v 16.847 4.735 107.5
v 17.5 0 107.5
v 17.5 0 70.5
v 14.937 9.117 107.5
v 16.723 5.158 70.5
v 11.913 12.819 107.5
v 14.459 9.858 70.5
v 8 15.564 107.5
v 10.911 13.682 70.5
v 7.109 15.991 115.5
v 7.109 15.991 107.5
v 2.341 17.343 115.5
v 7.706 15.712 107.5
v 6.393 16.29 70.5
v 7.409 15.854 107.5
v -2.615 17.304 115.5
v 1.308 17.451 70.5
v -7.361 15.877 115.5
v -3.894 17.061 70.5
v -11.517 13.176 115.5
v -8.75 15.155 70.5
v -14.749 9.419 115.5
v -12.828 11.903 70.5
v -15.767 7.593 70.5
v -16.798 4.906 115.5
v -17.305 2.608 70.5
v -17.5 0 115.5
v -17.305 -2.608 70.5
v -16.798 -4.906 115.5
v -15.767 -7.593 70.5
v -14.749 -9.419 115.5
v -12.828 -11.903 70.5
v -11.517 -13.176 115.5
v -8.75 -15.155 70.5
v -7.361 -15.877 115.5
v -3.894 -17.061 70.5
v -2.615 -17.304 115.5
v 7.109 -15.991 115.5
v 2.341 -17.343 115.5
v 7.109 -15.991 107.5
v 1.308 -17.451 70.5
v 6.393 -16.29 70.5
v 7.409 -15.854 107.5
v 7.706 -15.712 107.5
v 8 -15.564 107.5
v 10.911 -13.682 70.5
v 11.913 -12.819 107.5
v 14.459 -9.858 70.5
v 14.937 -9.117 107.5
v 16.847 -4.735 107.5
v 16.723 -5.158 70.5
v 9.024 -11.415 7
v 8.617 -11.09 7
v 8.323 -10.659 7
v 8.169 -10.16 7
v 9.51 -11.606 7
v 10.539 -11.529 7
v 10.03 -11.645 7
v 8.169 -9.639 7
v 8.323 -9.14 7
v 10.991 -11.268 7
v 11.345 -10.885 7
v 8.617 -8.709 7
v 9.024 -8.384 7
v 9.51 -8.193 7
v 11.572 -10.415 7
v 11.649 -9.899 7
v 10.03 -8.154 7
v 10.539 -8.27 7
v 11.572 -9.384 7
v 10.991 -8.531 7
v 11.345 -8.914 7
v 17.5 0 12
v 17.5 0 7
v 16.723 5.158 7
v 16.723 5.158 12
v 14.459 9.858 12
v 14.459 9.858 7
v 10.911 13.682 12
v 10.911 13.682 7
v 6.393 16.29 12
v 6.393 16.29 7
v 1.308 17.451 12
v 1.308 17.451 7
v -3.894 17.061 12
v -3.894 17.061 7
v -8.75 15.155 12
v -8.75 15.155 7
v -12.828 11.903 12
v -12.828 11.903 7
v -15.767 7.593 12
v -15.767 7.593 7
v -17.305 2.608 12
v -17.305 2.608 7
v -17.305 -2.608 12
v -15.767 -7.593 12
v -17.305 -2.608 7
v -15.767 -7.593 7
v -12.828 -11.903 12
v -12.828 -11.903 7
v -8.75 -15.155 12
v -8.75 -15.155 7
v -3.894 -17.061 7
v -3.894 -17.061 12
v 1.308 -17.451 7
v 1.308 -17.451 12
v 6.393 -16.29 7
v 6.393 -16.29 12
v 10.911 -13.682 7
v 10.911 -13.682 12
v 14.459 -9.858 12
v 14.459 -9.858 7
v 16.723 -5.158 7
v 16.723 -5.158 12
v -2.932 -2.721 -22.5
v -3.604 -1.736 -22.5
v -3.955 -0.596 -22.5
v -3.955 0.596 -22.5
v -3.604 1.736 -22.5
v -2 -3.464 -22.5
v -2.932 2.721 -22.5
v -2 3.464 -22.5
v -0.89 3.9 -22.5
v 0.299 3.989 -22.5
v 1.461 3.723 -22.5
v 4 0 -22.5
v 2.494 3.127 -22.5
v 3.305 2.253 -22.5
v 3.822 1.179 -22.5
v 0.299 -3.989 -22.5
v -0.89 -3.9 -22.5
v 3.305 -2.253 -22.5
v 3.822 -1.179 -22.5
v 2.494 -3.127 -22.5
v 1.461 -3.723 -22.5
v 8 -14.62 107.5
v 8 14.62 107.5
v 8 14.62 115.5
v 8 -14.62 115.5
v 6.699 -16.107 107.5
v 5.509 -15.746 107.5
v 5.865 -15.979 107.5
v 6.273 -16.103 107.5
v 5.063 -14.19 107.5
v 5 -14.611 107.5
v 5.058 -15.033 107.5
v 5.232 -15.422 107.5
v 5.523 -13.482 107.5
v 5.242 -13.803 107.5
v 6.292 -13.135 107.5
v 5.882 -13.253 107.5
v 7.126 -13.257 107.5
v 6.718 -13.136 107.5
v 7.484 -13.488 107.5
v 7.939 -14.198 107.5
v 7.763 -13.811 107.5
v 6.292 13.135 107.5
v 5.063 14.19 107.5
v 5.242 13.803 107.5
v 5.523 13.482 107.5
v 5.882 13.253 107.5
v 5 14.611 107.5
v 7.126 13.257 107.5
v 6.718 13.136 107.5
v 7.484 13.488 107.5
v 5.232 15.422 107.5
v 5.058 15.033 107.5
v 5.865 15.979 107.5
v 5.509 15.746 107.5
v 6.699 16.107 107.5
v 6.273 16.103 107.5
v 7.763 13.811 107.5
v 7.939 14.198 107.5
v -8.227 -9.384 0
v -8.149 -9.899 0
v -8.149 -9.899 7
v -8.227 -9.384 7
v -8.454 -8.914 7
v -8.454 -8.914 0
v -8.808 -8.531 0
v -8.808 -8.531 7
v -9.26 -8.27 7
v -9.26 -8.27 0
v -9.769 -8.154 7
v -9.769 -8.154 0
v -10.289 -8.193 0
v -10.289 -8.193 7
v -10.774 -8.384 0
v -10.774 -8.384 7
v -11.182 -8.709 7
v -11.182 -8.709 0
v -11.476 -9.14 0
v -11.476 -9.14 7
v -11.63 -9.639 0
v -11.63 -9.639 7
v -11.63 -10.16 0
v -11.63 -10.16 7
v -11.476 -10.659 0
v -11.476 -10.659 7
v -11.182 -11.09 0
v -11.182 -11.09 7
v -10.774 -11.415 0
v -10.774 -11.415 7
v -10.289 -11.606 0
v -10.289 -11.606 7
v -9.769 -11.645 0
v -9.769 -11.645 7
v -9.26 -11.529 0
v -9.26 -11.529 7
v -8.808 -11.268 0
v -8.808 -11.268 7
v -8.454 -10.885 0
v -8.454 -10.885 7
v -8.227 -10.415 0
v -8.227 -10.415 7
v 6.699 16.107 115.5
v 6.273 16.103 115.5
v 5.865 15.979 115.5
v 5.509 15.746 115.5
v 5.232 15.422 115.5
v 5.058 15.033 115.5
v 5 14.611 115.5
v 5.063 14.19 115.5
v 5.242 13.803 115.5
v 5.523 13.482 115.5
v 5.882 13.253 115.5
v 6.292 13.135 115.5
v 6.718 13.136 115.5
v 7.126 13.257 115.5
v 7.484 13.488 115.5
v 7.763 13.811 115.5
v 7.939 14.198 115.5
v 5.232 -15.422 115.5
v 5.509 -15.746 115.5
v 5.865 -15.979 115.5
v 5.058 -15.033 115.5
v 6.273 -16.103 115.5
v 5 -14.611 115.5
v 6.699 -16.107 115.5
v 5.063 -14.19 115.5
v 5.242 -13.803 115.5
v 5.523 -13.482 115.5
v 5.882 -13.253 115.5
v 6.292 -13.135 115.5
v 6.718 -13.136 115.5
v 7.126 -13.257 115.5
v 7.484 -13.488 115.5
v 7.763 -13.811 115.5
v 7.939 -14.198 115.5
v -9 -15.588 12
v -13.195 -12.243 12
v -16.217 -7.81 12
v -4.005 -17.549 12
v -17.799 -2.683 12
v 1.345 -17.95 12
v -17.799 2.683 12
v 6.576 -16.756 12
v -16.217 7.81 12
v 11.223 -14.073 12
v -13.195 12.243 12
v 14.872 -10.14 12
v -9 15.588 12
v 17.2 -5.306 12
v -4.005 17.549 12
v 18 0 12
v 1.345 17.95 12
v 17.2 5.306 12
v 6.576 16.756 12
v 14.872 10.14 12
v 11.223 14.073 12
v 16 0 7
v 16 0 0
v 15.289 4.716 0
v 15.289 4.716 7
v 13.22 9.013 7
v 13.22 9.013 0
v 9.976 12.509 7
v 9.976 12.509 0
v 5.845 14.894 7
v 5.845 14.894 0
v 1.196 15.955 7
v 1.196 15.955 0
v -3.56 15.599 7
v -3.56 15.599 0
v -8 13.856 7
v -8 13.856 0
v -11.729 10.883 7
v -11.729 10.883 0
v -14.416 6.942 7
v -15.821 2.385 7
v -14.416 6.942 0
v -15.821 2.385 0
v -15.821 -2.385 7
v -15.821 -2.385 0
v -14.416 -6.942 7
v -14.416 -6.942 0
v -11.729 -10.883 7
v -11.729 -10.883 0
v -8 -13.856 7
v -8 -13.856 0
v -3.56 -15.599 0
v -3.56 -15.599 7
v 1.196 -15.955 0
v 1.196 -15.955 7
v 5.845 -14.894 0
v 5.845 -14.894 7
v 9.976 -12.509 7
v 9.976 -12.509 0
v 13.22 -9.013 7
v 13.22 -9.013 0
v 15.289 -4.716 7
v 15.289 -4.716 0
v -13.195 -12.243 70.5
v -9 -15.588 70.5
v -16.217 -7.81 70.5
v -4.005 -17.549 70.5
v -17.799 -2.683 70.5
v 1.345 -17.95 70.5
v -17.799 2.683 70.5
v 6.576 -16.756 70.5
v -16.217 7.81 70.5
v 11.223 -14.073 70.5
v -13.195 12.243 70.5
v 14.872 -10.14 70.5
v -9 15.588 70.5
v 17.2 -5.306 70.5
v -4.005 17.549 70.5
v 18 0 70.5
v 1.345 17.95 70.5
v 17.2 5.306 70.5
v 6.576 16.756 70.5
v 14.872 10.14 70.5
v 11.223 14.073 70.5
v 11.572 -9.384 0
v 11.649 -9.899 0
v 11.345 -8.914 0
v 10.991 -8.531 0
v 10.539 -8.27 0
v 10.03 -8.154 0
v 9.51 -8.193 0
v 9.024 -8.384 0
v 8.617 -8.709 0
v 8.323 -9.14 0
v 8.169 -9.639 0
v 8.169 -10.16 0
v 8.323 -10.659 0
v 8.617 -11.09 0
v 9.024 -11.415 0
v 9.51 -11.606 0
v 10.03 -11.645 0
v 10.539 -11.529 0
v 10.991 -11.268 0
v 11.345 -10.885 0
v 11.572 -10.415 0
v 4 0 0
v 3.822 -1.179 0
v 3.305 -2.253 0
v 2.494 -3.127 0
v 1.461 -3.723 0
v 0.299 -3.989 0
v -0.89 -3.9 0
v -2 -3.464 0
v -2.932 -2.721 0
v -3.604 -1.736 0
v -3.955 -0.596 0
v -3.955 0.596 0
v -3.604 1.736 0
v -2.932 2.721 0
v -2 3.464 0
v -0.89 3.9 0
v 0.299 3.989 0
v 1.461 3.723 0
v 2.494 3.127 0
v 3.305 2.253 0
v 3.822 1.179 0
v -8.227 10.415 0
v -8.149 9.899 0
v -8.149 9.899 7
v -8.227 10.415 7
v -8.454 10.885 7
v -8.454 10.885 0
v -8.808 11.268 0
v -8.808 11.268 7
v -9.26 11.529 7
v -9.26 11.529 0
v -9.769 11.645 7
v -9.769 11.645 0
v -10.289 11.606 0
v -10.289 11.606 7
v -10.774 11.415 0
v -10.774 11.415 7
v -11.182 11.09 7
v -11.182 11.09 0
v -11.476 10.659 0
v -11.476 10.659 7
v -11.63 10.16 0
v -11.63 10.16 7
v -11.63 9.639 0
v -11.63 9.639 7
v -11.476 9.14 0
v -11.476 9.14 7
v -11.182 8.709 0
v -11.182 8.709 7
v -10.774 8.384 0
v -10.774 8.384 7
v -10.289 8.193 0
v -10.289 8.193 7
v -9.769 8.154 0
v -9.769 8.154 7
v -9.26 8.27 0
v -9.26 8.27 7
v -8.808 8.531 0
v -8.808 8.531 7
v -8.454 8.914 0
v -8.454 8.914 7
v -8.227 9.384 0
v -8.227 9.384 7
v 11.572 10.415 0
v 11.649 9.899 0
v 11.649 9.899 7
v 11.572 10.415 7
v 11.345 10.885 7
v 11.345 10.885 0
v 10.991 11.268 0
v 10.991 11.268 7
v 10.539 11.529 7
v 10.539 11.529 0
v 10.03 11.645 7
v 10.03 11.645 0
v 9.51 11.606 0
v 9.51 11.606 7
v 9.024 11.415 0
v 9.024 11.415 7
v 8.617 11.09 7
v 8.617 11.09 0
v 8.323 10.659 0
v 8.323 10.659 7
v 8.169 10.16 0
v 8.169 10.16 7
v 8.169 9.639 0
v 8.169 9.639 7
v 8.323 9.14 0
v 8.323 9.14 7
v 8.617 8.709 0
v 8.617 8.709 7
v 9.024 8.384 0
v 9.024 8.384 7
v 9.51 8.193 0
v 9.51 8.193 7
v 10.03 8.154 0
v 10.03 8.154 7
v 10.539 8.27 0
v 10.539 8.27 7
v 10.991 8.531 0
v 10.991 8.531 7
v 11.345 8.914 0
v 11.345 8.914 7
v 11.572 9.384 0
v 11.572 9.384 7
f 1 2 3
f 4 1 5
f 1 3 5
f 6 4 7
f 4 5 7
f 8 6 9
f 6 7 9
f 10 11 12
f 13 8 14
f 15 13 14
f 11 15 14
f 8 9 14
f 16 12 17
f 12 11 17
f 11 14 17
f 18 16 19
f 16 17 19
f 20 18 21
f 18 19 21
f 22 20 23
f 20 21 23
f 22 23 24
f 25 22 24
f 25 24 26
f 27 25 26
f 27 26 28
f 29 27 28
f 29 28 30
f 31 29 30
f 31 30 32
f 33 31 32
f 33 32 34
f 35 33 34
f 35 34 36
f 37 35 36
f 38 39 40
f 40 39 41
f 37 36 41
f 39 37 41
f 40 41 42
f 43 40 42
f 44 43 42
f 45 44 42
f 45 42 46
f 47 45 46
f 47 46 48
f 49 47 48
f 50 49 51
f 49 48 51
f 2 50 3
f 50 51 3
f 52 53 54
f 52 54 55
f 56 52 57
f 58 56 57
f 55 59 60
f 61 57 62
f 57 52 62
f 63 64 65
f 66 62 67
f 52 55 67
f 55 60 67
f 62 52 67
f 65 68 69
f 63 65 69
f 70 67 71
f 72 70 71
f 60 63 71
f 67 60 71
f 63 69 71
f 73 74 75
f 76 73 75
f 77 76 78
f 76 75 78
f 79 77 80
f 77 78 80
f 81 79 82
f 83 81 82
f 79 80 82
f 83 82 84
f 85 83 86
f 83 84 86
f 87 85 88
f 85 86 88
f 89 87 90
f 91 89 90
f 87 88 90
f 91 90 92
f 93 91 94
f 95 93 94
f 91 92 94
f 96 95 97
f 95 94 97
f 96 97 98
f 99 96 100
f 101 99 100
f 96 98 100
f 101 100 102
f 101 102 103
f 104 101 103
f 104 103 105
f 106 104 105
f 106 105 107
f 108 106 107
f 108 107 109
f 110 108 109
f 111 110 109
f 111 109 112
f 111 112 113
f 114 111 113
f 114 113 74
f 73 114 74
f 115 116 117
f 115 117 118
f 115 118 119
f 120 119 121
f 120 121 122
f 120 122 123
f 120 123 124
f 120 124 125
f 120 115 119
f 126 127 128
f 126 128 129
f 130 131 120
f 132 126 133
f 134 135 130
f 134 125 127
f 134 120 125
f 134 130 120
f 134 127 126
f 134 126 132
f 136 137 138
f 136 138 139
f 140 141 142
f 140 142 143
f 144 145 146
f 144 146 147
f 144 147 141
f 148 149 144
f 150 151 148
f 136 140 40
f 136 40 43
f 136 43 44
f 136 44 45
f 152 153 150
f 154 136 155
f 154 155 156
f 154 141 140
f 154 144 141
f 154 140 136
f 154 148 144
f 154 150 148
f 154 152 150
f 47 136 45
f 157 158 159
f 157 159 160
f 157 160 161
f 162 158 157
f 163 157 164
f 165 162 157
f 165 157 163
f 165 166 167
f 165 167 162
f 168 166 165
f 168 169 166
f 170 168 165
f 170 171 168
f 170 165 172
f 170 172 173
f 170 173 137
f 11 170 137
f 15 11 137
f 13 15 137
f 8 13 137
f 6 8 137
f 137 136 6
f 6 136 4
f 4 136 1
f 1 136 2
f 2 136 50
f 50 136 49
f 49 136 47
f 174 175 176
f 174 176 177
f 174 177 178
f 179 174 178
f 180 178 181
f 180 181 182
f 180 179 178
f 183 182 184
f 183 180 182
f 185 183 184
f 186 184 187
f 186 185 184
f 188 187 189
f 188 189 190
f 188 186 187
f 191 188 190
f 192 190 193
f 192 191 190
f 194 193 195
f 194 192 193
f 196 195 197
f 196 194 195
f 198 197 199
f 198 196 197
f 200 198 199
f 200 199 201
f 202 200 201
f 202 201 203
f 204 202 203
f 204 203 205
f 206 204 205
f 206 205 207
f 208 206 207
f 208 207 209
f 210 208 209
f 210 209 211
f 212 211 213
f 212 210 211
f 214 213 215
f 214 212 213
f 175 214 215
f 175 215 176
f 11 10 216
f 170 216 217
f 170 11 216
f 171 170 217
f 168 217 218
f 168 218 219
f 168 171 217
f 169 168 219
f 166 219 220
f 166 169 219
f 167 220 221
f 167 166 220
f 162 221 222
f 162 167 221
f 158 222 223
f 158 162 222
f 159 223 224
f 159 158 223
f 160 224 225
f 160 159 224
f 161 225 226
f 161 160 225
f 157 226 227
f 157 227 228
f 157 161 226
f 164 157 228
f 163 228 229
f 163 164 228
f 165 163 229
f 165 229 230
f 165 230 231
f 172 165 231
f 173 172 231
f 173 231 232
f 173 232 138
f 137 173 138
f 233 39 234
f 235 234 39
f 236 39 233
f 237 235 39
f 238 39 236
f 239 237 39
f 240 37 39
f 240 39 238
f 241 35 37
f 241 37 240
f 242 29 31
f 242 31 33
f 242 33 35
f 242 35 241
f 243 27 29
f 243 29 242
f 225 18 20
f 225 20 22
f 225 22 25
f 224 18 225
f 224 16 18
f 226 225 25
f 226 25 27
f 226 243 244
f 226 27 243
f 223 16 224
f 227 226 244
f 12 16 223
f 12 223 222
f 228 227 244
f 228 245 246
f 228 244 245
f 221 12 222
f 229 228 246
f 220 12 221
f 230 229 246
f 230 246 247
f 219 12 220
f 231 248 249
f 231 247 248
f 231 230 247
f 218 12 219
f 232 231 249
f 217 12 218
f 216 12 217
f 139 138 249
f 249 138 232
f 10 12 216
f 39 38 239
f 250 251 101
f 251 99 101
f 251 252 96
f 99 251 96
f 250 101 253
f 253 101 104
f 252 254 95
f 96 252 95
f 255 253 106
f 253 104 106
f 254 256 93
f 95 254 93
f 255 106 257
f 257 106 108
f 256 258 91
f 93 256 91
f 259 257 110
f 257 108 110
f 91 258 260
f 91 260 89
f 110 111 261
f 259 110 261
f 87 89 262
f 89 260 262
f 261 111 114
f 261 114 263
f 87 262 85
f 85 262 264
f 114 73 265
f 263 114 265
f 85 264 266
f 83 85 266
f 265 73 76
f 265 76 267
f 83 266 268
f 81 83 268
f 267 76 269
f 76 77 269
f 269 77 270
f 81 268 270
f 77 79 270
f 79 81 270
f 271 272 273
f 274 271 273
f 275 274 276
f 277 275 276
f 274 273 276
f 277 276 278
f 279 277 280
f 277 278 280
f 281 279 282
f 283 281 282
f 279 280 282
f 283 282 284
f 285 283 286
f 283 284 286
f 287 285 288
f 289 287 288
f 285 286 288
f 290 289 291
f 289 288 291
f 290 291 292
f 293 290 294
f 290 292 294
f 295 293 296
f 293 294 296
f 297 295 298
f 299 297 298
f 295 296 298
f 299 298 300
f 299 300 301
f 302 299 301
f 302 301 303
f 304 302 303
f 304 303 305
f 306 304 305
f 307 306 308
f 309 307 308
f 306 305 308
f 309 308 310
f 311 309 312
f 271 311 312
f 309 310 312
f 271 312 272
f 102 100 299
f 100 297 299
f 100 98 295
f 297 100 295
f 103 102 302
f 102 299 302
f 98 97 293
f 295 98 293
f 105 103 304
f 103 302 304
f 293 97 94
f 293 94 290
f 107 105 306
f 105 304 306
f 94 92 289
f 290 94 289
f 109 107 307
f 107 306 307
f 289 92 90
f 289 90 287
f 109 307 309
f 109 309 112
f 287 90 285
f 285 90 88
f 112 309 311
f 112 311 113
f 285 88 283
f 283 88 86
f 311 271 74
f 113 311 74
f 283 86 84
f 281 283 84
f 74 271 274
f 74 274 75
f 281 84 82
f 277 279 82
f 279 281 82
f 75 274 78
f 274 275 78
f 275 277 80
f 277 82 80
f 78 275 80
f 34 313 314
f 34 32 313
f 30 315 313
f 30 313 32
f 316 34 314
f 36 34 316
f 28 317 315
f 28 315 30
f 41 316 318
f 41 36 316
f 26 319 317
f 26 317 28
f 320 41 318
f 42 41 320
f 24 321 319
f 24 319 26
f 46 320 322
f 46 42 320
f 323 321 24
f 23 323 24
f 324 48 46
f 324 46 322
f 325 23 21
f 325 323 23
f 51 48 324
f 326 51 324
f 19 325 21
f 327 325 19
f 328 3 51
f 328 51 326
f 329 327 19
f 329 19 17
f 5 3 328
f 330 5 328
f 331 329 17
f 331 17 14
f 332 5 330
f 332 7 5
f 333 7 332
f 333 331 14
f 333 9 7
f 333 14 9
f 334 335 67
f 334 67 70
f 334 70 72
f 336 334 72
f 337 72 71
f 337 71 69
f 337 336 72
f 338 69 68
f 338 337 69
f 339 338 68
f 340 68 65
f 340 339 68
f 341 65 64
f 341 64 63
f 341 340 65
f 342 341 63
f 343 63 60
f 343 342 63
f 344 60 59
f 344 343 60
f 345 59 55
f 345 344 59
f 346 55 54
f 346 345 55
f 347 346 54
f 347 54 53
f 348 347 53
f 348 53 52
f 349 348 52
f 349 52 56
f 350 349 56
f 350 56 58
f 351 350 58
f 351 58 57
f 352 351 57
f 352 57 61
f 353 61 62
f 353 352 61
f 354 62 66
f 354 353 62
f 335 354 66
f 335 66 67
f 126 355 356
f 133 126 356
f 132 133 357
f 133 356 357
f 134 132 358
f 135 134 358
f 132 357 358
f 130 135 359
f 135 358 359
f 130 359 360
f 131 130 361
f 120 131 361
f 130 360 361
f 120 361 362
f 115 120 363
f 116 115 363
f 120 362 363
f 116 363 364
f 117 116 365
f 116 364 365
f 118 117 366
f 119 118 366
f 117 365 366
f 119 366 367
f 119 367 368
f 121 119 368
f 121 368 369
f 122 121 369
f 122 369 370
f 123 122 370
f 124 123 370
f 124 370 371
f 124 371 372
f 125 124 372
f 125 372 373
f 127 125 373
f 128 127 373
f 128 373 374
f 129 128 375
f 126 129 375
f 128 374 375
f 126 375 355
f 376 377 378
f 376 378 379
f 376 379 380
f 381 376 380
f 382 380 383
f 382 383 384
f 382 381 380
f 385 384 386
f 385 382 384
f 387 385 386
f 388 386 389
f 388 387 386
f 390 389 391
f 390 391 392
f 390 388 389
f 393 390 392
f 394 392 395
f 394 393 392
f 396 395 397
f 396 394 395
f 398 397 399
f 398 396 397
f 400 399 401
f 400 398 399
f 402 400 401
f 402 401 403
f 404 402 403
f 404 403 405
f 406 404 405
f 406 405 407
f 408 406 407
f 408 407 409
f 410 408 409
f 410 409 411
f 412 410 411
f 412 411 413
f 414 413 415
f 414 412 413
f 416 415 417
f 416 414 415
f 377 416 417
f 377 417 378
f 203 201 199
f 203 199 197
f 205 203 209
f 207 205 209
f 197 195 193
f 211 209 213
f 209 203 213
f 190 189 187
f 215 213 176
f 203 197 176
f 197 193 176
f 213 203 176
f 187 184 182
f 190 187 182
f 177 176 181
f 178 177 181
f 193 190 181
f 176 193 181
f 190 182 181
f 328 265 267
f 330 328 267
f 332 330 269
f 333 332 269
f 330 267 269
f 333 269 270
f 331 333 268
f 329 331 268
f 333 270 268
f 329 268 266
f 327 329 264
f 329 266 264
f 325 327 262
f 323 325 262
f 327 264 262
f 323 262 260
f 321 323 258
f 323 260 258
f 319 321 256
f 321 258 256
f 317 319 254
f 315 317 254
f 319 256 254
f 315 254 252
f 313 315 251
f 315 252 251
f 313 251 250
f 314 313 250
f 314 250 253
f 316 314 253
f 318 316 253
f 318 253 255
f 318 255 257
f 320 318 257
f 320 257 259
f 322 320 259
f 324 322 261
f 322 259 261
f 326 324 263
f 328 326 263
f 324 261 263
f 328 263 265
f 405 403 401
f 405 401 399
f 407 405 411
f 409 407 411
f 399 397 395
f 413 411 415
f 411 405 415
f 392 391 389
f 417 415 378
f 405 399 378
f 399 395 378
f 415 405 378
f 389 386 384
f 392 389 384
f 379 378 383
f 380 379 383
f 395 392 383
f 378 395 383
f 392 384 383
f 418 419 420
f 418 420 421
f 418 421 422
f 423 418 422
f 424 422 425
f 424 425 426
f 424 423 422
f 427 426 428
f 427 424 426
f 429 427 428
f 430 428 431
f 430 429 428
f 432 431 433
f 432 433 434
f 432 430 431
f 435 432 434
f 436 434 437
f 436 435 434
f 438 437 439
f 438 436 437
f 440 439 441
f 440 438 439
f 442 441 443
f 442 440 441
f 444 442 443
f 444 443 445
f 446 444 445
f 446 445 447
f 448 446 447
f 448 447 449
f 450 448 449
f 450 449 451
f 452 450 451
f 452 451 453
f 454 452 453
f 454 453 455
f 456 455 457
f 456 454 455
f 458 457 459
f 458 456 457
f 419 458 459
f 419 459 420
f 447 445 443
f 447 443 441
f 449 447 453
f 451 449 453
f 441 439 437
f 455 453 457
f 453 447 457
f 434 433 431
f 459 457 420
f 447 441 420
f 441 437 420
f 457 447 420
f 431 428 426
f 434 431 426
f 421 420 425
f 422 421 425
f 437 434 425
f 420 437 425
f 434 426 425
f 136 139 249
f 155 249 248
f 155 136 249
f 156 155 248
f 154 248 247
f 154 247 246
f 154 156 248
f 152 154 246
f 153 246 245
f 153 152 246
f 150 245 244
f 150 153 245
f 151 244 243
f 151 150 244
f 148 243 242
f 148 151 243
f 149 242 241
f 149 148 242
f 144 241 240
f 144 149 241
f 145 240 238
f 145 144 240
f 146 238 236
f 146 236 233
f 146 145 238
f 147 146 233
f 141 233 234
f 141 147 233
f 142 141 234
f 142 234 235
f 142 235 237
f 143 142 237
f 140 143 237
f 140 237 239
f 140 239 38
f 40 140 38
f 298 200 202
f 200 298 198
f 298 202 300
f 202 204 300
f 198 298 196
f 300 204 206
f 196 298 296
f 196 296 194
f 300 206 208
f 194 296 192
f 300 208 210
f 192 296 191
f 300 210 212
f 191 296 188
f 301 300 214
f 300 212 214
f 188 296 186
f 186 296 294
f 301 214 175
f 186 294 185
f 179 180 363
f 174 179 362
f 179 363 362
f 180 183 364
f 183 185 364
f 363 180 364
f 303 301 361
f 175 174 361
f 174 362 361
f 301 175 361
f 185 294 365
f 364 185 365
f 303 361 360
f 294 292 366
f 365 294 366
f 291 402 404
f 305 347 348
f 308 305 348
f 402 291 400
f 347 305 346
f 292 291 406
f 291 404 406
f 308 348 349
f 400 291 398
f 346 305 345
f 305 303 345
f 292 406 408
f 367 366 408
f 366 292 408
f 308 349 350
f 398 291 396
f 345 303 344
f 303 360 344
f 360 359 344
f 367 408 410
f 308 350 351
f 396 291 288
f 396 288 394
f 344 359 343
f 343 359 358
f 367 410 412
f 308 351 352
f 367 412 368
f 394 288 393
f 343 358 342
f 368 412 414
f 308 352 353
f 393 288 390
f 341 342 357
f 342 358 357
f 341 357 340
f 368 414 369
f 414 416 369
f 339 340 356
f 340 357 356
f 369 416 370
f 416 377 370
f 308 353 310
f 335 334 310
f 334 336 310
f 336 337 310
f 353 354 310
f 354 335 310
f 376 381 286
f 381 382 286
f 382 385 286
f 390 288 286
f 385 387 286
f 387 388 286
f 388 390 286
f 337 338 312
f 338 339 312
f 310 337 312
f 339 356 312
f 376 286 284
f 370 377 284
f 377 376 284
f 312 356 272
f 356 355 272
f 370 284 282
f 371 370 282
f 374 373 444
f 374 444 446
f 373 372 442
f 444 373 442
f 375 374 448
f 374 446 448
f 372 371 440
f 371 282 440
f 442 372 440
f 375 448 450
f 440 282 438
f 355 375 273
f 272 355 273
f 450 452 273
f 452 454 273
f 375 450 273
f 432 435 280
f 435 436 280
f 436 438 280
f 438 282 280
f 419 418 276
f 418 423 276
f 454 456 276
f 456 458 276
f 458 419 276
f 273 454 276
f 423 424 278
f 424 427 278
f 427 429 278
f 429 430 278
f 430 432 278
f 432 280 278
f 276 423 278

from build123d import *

# Parameters (mm, degrees)
SKETCH1_R           = 16
SKETCH1_R_2         = 1.75
SKETCH1_R_3         = 11.25
BOSS_EXTRUDE1_DEPTH = 7
SKETCH2_R           = 17.5
BOSS_EXTRUDE2_DEPTH = 108.5
SKETCH3_R           = 4
BOSS_EXTRUDE3_DEPTH = 22.5
BOSS_EXTRUDE4_START = -103.5
SKETCH4_R           = 18
SKETCH4_R_2         = 17.5
BOSS_EXTRUDE4_DEPTH = 58.5
CUT_EXTRUDE1_START  = -8
CUT_EXTRUDE1_DEPTH  = 8
CUT_EXTRUDE3_START  = -8
CUT_EXTRUDE3_DEPTH  = 8


with BuildPart() as part:
    # Sketch1 → Boss-Extrude1 (new body)
    # profile 1 of 2: a face of its own
    with BuildSketch(Plane.XY):
        Circle(SKETCH1_R)
        with Locations((9.899494937, 9.899494937)):
            Circle(SKETCH1_R_2, mode=Mode.SUBTRACT)
        with Locations((-9.899494937, 9.899494937)):
            Circle(SKETCH1_R_2, mode=Mode.SUBTRACT)
        with Locations((-9.899494937, -9.899494937)):
            Circle(SKETCH1_R_2, mode=Mode.SUBTRACT)
        with Locations((9.899494937, -9.899494937)):
            Circle(SKETCH1_R_2, mode=Mode.SUBTRACT)
        Circle(SKETCH1_R_3, mode=Mode.SUBTRACT)
    # profile 2 of 2: a face of its own
    with BuildSketch(Plane.XY):
        Circle(SKETCH1_R_3)
    extrude(amount=BOSS_EXTRUDE1_DEPTH)

    # Sketch2 → Boss-Extrude2 (add)
    with BuildSketch(Plane.XY.offset(7)):
        Circle(SKETCH2_R)
    extrude(amount=BOSS_EXTRUDE2_DEPTH)

    # Sketch3 → Boss-Extrude3 (add)
    with BuildSketch(Plane(origin=(0, 0, 0), x_dir=(-1, 0, 0), z_dir=(0, 0, -1))):
        with Locations(Location((0, 0, 0), (0, 0, 180))):
            Circle(SKETCH3_R)
    extrude(amount=BOSS_EXTRUDE3_DEPTH)

    # Sketch4 → Boss-Extrude4 (add)
    with BuildSketch(Plane.XY.offset(115.5).offset(BOSS_EXTRUDE4_START)):
        Circle(SKETCH4_R)
        Circle(SKETCH4_R_2, mode=Mode.SUBTRACT)
    extrude(amount=BOSS_EXTRUDE4_DEPTH)

    # Sketch5 → Cut-Extrude1 (cut)
    with BuildSketch(Plane.XY.offset(115.5).offset(CUT_EXTRUDE1_START)):
        with BuildLine():
            Line((8, 15.564382416), (8, -15.564382416))
            ThreePointArc((8, -15.564382416), (17.5, 0), (8, 15.564382416))
        make_face()
    extrude(amount=CUT_EXTRUDE1_DEPTH, mode=Mode.SUBTRACT)

    # Sketch6 → Cut-Extrude3 (cut)
    with BuildSketch(Plane.XY.offset(115.5).offset(CUT_EXTRUDE3_START)):
        with BuildLine():
            Line((8, 14.620191517), (8, 15.564382416))
            ThreePointArc((8, 15.564382416), (7.557695982, 15.783891518), (7.109375, 15.990834472))
            ThreePointArc((7.109375, 15.990834472), (5.242211763, 13.802897965), (8, 14.620191517))
        make_face()
        with BuildLine():
            Line((8, -15.564382416), (8, -14.620191517))
            ThreePointArc((8, -14.620191517), (5.242211763, -13.802897965), (7.109375, -15.990834472))
            ThreePointArc((7.109375, -15.990834472), (7.557695982, -15.783891518), (8, -15.564382416))
        make_face()
    extrude(amount=CUT_EXTRUDE3_DEPTH, mode=Mode.SUBTRACT)


solid = part.part
